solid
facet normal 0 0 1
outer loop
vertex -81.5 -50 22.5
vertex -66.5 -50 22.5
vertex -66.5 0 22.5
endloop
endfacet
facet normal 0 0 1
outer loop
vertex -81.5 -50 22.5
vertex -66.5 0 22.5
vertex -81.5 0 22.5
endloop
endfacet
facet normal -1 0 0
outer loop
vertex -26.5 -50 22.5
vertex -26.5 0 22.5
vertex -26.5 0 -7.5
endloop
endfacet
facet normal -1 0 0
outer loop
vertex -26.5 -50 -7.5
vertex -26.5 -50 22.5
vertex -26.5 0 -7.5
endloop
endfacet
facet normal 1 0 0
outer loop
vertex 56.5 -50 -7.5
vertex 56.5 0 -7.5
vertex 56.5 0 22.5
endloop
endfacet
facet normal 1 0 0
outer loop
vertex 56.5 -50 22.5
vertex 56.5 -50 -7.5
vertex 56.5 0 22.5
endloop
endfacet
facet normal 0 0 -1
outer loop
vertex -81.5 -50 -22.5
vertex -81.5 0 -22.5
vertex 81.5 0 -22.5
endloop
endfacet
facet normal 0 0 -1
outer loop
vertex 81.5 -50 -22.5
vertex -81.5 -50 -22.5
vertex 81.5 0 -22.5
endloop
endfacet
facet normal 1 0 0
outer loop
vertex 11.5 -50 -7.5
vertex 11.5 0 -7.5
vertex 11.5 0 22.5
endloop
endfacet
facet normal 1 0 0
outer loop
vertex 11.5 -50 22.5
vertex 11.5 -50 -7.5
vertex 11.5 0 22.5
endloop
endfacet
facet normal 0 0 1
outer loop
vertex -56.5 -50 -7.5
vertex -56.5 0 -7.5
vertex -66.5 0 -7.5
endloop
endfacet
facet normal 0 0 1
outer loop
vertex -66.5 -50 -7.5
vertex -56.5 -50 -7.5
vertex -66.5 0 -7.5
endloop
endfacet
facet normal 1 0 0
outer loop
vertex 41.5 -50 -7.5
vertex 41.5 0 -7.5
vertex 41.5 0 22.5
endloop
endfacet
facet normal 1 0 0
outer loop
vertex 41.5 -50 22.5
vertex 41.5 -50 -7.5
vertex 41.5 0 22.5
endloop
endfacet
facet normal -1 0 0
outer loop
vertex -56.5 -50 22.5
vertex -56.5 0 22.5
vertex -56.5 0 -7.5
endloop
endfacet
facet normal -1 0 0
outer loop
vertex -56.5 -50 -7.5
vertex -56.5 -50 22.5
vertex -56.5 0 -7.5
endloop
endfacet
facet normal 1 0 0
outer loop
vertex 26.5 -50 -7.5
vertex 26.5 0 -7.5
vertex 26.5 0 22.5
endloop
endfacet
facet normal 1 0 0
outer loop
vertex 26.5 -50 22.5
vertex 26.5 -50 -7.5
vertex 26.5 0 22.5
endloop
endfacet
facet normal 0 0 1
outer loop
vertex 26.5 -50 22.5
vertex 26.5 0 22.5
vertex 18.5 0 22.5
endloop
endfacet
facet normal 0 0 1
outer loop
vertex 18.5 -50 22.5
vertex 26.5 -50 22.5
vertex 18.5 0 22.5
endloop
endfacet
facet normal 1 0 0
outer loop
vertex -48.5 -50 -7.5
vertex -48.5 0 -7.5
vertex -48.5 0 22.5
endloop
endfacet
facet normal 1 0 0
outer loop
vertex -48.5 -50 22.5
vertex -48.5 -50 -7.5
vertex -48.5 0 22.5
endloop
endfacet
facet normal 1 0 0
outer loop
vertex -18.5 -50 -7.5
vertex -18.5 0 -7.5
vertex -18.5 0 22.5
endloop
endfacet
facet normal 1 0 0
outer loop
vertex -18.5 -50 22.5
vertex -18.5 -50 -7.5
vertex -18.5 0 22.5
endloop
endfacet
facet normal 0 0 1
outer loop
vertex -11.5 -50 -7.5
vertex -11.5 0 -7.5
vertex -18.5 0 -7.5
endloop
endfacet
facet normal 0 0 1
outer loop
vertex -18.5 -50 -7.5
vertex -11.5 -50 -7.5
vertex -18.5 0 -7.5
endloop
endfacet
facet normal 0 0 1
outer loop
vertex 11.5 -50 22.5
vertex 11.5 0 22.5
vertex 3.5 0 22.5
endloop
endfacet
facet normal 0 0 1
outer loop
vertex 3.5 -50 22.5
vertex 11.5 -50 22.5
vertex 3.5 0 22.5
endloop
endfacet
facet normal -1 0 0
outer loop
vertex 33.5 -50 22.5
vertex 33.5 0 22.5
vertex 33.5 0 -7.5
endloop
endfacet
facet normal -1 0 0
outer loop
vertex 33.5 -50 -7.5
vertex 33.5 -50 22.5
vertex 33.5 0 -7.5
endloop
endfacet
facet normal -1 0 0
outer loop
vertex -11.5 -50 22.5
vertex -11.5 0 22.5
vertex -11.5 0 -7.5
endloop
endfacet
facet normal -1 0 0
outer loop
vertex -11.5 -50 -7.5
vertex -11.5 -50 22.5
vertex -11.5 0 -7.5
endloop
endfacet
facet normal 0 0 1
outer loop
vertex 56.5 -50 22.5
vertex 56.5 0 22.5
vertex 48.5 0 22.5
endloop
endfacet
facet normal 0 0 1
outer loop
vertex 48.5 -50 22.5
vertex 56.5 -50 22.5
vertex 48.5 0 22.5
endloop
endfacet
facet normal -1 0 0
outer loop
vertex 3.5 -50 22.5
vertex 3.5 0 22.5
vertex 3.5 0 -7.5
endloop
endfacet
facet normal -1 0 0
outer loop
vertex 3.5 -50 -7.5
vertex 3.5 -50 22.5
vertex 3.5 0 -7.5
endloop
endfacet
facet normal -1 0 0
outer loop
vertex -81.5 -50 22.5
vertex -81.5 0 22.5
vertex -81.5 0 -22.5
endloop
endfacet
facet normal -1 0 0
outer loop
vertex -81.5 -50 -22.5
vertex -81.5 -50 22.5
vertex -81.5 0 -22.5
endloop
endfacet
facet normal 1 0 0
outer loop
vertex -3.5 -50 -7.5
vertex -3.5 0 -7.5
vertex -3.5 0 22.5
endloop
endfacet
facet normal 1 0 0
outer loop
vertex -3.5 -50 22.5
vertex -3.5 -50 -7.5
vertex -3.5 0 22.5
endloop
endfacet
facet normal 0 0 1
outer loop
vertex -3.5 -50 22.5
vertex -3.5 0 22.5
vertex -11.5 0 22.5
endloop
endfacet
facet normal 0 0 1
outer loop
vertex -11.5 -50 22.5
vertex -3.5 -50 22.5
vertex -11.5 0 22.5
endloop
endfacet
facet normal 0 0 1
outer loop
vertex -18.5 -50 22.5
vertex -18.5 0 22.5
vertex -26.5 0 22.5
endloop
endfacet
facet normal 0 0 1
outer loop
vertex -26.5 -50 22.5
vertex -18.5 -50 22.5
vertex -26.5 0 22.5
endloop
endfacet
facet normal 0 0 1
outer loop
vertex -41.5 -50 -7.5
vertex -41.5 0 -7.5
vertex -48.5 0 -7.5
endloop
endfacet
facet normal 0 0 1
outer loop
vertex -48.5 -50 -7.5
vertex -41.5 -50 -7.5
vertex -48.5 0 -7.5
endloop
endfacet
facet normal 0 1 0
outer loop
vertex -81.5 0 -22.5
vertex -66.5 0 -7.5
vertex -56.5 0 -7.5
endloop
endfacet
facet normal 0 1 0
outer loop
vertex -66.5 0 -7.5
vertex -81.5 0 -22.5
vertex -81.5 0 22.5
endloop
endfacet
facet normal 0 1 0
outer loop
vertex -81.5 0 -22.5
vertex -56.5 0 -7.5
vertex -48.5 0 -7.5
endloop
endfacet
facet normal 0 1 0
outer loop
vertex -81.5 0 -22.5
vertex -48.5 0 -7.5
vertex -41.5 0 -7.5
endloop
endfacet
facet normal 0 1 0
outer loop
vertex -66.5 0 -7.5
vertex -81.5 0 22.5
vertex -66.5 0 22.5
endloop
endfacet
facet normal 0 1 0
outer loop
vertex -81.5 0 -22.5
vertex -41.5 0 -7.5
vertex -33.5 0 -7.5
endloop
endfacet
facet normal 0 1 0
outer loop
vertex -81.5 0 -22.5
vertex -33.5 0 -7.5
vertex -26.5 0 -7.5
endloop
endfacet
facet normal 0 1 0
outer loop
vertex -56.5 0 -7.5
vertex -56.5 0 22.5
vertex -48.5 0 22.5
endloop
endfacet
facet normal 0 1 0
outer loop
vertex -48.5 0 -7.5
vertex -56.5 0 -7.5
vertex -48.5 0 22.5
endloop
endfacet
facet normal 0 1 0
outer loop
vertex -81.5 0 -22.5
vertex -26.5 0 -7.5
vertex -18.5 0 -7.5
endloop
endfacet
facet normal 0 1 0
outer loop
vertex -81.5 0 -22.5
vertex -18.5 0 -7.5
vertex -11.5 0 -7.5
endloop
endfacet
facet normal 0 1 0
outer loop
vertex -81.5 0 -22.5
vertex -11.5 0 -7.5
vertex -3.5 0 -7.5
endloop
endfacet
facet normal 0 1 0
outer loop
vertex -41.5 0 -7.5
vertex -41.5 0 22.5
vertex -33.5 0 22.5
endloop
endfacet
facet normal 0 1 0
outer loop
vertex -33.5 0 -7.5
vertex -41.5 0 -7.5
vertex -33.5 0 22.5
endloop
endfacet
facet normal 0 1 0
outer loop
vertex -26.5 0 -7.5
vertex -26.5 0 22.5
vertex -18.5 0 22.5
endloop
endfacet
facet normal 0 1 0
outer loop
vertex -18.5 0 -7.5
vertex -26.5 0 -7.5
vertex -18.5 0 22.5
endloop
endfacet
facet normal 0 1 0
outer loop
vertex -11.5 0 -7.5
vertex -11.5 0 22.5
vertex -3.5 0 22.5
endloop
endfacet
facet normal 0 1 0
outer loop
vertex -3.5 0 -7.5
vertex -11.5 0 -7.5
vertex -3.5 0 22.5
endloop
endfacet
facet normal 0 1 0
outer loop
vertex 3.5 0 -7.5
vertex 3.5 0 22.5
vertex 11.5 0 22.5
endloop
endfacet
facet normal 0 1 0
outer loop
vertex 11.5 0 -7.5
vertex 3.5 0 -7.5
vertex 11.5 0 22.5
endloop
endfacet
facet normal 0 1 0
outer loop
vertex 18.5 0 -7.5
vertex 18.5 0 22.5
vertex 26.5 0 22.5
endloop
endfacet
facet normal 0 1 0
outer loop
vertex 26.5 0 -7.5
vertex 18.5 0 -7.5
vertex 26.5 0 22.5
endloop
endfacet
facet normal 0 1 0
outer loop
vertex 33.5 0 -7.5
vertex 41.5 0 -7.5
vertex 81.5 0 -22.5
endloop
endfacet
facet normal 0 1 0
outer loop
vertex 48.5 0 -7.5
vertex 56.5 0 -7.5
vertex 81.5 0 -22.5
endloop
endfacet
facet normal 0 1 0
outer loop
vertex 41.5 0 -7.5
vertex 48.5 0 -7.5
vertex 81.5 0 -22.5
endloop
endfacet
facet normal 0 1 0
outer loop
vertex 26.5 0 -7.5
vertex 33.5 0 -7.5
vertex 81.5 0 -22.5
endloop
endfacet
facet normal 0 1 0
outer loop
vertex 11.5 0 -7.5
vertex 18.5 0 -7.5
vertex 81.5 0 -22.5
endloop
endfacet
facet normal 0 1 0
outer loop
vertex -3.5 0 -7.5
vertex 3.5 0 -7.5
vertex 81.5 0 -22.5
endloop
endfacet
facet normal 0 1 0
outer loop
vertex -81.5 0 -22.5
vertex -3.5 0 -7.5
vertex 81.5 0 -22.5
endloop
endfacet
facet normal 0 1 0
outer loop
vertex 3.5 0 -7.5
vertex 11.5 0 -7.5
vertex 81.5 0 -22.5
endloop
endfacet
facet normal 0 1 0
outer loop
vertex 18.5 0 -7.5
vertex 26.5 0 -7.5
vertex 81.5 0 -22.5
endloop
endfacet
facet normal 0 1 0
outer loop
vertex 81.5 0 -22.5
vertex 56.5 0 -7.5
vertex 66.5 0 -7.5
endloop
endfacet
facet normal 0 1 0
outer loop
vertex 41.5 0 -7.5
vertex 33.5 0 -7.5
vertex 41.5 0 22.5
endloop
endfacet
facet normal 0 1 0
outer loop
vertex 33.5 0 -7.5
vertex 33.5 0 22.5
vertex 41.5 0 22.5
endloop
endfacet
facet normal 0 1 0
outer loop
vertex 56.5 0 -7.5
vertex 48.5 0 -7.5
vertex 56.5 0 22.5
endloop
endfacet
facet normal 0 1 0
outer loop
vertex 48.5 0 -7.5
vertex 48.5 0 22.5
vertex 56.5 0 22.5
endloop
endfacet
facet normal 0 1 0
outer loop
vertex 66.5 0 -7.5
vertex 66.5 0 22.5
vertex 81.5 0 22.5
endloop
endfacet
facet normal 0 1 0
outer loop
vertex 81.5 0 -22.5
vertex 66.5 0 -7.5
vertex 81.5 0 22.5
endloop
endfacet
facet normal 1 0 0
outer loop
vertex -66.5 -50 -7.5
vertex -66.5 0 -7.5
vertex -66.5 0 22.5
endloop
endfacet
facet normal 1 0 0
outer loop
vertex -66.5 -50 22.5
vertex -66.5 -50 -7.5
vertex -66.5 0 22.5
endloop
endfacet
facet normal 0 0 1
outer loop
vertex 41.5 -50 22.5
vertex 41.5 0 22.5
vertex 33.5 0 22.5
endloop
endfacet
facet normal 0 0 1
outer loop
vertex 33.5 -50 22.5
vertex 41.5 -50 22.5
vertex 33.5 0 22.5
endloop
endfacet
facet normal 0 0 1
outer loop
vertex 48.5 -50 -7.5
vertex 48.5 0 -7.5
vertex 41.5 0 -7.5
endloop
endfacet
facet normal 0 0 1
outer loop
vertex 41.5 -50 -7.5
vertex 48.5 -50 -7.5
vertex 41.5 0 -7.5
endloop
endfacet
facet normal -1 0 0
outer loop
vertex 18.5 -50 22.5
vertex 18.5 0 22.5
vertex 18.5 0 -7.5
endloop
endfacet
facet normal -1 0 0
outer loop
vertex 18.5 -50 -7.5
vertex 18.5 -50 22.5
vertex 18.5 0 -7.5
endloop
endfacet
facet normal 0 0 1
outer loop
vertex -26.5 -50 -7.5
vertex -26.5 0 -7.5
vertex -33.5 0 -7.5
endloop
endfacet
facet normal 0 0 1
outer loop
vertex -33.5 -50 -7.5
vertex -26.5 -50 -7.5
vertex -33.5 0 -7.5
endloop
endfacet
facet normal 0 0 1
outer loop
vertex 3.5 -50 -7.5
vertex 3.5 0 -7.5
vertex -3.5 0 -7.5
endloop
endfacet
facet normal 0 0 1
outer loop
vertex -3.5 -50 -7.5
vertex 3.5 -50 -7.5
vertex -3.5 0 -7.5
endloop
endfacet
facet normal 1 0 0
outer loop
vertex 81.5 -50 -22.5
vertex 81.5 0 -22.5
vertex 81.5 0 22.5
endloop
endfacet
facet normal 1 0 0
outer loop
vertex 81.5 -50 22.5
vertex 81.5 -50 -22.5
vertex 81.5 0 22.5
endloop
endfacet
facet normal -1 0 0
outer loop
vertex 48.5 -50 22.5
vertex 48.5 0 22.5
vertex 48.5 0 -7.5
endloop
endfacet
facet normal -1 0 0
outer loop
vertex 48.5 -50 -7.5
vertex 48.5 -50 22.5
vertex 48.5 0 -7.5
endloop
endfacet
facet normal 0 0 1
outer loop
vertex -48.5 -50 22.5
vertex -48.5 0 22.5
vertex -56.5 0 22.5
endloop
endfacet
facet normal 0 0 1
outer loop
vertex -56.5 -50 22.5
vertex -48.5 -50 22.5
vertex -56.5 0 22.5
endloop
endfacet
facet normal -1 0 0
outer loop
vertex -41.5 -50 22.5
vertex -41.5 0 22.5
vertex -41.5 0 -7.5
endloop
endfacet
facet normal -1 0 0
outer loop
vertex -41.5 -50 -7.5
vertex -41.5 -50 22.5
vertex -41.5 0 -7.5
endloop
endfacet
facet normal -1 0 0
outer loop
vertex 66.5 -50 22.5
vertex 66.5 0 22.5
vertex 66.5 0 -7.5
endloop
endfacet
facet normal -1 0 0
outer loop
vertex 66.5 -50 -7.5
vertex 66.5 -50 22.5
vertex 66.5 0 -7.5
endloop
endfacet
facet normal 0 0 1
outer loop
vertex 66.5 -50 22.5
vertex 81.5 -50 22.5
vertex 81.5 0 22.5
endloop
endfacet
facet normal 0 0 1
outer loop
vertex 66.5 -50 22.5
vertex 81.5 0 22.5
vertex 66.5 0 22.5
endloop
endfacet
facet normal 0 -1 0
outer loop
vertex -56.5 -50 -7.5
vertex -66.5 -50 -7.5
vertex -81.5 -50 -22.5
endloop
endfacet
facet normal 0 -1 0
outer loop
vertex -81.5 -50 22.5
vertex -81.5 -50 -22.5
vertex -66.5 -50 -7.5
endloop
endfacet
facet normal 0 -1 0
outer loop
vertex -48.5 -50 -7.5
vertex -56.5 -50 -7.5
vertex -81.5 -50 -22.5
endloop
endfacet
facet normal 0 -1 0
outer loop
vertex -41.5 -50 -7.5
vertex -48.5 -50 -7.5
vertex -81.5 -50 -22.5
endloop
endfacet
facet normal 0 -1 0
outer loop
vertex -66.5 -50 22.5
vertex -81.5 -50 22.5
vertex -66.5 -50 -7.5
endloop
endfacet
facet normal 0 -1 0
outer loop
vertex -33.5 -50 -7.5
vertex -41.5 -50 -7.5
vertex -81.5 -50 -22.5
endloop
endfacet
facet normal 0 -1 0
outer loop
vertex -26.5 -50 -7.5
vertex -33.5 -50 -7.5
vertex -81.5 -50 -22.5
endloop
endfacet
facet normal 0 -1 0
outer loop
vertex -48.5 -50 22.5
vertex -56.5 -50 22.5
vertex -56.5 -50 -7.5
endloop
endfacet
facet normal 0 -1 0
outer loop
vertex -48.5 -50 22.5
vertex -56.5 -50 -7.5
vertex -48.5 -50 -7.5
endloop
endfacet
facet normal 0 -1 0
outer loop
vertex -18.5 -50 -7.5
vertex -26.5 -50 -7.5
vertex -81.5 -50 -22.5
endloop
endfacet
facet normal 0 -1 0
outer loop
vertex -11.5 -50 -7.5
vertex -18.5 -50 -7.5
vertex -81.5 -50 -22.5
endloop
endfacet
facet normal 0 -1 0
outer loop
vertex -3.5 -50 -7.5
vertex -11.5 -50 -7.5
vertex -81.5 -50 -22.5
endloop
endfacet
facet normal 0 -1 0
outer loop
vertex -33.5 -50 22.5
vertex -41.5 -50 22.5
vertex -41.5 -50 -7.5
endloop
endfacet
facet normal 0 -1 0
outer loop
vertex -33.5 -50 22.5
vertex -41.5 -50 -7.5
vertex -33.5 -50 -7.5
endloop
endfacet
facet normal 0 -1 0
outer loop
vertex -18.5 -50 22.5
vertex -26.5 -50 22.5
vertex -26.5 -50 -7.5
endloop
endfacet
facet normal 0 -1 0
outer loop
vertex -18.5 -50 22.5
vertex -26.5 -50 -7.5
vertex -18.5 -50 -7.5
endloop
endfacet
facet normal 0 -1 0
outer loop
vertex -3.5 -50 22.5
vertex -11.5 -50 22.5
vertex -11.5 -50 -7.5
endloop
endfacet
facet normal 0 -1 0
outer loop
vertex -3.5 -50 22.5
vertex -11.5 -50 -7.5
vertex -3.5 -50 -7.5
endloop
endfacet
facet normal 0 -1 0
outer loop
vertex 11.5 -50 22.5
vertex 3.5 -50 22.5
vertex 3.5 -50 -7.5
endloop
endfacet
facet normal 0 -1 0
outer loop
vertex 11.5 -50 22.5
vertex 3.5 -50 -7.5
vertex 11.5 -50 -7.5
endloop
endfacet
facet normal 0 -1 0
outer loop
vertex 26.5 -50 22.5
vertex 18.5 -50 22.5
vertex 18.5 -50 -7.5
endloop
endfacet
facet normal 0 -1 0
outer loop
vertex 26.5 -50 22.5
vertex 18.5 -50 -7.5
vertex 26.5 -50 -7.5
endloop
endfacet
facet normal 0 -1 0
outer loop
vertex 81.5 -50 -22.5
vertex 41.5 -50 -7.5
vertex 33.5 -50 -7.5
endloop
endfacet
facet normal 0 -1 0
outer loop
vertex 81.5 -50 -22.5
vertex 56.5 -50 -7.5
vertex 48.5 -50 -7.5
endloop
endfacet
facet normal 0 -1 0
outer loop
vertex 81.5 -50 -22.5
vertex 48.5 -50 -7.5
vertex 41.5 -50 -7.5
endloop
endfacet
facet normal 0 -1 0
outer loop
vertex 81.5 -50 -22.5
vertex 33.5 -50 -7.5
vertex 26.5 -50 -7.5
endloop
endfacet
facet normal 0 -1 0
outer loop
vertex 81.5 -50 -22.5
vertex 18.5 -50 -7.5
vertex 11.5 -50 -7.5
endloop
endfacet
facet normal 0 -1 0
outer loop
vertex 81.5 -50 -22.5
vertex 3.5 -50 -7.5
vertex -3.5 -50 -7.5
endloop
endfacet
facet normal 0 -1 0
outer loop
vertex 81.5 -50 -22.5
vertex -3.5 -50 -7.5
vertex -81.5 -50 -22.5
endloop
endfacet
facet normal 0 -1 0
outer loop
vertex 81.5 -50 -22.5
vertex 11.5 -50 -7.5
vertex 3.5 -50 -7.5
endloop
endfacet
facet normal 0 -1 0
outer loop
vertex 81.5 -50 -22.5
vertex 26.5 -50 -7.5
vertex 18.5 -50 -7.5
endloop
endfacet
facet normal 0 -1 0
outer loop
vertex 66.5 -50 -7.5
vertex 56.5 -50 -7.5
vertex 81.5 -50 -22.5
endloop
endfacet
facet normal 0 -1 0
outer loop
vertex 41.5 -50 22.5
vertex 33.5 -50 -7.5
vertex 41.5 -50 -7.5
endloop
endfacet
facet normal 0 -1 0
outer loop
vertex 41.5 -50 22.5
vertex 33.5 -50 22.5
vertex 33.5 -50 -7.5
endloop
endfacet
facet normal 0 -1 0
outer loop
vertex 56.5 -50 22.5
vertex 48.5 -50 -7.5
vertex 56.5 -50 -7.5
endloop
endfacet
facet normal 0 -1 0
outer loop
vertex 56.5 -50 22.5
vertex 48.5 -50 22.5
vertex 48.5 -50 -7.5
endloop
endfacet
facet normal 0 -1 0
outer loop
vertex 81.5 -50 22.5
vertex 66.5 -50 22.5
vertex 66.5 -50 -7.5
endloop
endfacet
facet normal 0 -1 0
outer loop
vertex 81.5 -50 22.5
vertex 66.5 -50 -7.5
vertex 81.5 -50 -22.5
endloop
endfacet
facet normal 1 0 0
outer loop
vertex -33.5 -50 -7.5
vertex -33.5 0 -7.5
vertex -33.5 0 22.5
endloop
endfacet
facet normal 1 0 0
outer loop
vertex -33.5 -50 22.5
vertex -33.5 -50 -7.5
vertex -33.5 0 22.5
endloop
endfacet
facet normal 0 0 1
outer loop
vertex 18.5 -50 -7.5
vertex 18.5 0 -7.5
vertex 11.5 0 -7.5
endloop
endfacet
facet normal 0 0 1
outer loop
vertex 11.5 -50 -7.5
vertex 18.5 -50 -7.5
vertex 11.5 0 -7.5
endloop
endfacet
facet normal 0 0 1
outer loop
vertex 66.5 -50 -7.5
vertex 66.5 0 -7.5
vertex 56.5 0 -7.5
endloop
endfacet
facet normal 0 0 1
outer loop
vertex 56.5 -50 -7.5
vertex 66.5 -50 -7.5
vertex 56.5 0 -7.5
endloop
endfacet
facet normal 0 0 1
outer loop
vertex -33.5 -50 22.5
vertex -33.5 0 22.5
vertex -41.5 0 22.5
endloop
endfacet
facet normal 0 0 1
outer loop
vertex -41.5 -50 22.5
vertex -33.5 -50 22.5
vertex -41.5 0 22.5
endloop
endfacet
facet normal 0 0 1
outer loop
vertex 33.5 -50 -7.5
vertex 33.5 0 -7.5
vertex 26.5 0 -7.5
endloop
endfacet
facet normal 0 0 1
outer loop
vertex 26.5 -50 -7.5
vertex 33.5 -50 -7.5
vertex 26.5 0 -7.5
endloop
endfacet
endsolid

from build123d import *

# Parameters (mm, degrees)
F1_DEPTH = 50


with BuildPart() as f1:
    # F0 (on Front) → F1 (new body)
    with BuildSketch(Plane.XZ):
        Polygon((-81.5, -22.5), (81.5, -22.5), (81.5, 22.5), (66.5, 22.5), (66.5, -7.5), (56.5, -7.5), (56.5, 22.5), (48.5, 22.5), (48.5, -7.5), (41.5, -7.5), (41.5, 22.5), (33.5, 22.5), (33.5, -7.5), (26.5, -7.5), (26.5, 22.5), (18.5, 22.5), (18.5, -7.5), (11.5, -7.5), (11.5, 22.5), (3.5, 22.5), (3.5, -7.5), (-3.5, -7.5), (-3.5, 22.5), (-11.5, 22.5), (-11.5, -7.5), (-18.5, -7.5), (-18.5, 22.5), (-26.5, 22.5), (-26.5, -7.5), (-33.5, -7.5), (-33.5, 22.5), (-41.5, 22.5), (-41.5, -7.5), (-48.5, -7.5), (-48.5, 22.5), (-56.5, 22.5), (-56.5, -7.5), (-66.5, -7.5), (-66.5, 22.5), (-81.5, 22.5), align=None)
    extrude(amount=F1_DEPTH)


solid = f1.part
